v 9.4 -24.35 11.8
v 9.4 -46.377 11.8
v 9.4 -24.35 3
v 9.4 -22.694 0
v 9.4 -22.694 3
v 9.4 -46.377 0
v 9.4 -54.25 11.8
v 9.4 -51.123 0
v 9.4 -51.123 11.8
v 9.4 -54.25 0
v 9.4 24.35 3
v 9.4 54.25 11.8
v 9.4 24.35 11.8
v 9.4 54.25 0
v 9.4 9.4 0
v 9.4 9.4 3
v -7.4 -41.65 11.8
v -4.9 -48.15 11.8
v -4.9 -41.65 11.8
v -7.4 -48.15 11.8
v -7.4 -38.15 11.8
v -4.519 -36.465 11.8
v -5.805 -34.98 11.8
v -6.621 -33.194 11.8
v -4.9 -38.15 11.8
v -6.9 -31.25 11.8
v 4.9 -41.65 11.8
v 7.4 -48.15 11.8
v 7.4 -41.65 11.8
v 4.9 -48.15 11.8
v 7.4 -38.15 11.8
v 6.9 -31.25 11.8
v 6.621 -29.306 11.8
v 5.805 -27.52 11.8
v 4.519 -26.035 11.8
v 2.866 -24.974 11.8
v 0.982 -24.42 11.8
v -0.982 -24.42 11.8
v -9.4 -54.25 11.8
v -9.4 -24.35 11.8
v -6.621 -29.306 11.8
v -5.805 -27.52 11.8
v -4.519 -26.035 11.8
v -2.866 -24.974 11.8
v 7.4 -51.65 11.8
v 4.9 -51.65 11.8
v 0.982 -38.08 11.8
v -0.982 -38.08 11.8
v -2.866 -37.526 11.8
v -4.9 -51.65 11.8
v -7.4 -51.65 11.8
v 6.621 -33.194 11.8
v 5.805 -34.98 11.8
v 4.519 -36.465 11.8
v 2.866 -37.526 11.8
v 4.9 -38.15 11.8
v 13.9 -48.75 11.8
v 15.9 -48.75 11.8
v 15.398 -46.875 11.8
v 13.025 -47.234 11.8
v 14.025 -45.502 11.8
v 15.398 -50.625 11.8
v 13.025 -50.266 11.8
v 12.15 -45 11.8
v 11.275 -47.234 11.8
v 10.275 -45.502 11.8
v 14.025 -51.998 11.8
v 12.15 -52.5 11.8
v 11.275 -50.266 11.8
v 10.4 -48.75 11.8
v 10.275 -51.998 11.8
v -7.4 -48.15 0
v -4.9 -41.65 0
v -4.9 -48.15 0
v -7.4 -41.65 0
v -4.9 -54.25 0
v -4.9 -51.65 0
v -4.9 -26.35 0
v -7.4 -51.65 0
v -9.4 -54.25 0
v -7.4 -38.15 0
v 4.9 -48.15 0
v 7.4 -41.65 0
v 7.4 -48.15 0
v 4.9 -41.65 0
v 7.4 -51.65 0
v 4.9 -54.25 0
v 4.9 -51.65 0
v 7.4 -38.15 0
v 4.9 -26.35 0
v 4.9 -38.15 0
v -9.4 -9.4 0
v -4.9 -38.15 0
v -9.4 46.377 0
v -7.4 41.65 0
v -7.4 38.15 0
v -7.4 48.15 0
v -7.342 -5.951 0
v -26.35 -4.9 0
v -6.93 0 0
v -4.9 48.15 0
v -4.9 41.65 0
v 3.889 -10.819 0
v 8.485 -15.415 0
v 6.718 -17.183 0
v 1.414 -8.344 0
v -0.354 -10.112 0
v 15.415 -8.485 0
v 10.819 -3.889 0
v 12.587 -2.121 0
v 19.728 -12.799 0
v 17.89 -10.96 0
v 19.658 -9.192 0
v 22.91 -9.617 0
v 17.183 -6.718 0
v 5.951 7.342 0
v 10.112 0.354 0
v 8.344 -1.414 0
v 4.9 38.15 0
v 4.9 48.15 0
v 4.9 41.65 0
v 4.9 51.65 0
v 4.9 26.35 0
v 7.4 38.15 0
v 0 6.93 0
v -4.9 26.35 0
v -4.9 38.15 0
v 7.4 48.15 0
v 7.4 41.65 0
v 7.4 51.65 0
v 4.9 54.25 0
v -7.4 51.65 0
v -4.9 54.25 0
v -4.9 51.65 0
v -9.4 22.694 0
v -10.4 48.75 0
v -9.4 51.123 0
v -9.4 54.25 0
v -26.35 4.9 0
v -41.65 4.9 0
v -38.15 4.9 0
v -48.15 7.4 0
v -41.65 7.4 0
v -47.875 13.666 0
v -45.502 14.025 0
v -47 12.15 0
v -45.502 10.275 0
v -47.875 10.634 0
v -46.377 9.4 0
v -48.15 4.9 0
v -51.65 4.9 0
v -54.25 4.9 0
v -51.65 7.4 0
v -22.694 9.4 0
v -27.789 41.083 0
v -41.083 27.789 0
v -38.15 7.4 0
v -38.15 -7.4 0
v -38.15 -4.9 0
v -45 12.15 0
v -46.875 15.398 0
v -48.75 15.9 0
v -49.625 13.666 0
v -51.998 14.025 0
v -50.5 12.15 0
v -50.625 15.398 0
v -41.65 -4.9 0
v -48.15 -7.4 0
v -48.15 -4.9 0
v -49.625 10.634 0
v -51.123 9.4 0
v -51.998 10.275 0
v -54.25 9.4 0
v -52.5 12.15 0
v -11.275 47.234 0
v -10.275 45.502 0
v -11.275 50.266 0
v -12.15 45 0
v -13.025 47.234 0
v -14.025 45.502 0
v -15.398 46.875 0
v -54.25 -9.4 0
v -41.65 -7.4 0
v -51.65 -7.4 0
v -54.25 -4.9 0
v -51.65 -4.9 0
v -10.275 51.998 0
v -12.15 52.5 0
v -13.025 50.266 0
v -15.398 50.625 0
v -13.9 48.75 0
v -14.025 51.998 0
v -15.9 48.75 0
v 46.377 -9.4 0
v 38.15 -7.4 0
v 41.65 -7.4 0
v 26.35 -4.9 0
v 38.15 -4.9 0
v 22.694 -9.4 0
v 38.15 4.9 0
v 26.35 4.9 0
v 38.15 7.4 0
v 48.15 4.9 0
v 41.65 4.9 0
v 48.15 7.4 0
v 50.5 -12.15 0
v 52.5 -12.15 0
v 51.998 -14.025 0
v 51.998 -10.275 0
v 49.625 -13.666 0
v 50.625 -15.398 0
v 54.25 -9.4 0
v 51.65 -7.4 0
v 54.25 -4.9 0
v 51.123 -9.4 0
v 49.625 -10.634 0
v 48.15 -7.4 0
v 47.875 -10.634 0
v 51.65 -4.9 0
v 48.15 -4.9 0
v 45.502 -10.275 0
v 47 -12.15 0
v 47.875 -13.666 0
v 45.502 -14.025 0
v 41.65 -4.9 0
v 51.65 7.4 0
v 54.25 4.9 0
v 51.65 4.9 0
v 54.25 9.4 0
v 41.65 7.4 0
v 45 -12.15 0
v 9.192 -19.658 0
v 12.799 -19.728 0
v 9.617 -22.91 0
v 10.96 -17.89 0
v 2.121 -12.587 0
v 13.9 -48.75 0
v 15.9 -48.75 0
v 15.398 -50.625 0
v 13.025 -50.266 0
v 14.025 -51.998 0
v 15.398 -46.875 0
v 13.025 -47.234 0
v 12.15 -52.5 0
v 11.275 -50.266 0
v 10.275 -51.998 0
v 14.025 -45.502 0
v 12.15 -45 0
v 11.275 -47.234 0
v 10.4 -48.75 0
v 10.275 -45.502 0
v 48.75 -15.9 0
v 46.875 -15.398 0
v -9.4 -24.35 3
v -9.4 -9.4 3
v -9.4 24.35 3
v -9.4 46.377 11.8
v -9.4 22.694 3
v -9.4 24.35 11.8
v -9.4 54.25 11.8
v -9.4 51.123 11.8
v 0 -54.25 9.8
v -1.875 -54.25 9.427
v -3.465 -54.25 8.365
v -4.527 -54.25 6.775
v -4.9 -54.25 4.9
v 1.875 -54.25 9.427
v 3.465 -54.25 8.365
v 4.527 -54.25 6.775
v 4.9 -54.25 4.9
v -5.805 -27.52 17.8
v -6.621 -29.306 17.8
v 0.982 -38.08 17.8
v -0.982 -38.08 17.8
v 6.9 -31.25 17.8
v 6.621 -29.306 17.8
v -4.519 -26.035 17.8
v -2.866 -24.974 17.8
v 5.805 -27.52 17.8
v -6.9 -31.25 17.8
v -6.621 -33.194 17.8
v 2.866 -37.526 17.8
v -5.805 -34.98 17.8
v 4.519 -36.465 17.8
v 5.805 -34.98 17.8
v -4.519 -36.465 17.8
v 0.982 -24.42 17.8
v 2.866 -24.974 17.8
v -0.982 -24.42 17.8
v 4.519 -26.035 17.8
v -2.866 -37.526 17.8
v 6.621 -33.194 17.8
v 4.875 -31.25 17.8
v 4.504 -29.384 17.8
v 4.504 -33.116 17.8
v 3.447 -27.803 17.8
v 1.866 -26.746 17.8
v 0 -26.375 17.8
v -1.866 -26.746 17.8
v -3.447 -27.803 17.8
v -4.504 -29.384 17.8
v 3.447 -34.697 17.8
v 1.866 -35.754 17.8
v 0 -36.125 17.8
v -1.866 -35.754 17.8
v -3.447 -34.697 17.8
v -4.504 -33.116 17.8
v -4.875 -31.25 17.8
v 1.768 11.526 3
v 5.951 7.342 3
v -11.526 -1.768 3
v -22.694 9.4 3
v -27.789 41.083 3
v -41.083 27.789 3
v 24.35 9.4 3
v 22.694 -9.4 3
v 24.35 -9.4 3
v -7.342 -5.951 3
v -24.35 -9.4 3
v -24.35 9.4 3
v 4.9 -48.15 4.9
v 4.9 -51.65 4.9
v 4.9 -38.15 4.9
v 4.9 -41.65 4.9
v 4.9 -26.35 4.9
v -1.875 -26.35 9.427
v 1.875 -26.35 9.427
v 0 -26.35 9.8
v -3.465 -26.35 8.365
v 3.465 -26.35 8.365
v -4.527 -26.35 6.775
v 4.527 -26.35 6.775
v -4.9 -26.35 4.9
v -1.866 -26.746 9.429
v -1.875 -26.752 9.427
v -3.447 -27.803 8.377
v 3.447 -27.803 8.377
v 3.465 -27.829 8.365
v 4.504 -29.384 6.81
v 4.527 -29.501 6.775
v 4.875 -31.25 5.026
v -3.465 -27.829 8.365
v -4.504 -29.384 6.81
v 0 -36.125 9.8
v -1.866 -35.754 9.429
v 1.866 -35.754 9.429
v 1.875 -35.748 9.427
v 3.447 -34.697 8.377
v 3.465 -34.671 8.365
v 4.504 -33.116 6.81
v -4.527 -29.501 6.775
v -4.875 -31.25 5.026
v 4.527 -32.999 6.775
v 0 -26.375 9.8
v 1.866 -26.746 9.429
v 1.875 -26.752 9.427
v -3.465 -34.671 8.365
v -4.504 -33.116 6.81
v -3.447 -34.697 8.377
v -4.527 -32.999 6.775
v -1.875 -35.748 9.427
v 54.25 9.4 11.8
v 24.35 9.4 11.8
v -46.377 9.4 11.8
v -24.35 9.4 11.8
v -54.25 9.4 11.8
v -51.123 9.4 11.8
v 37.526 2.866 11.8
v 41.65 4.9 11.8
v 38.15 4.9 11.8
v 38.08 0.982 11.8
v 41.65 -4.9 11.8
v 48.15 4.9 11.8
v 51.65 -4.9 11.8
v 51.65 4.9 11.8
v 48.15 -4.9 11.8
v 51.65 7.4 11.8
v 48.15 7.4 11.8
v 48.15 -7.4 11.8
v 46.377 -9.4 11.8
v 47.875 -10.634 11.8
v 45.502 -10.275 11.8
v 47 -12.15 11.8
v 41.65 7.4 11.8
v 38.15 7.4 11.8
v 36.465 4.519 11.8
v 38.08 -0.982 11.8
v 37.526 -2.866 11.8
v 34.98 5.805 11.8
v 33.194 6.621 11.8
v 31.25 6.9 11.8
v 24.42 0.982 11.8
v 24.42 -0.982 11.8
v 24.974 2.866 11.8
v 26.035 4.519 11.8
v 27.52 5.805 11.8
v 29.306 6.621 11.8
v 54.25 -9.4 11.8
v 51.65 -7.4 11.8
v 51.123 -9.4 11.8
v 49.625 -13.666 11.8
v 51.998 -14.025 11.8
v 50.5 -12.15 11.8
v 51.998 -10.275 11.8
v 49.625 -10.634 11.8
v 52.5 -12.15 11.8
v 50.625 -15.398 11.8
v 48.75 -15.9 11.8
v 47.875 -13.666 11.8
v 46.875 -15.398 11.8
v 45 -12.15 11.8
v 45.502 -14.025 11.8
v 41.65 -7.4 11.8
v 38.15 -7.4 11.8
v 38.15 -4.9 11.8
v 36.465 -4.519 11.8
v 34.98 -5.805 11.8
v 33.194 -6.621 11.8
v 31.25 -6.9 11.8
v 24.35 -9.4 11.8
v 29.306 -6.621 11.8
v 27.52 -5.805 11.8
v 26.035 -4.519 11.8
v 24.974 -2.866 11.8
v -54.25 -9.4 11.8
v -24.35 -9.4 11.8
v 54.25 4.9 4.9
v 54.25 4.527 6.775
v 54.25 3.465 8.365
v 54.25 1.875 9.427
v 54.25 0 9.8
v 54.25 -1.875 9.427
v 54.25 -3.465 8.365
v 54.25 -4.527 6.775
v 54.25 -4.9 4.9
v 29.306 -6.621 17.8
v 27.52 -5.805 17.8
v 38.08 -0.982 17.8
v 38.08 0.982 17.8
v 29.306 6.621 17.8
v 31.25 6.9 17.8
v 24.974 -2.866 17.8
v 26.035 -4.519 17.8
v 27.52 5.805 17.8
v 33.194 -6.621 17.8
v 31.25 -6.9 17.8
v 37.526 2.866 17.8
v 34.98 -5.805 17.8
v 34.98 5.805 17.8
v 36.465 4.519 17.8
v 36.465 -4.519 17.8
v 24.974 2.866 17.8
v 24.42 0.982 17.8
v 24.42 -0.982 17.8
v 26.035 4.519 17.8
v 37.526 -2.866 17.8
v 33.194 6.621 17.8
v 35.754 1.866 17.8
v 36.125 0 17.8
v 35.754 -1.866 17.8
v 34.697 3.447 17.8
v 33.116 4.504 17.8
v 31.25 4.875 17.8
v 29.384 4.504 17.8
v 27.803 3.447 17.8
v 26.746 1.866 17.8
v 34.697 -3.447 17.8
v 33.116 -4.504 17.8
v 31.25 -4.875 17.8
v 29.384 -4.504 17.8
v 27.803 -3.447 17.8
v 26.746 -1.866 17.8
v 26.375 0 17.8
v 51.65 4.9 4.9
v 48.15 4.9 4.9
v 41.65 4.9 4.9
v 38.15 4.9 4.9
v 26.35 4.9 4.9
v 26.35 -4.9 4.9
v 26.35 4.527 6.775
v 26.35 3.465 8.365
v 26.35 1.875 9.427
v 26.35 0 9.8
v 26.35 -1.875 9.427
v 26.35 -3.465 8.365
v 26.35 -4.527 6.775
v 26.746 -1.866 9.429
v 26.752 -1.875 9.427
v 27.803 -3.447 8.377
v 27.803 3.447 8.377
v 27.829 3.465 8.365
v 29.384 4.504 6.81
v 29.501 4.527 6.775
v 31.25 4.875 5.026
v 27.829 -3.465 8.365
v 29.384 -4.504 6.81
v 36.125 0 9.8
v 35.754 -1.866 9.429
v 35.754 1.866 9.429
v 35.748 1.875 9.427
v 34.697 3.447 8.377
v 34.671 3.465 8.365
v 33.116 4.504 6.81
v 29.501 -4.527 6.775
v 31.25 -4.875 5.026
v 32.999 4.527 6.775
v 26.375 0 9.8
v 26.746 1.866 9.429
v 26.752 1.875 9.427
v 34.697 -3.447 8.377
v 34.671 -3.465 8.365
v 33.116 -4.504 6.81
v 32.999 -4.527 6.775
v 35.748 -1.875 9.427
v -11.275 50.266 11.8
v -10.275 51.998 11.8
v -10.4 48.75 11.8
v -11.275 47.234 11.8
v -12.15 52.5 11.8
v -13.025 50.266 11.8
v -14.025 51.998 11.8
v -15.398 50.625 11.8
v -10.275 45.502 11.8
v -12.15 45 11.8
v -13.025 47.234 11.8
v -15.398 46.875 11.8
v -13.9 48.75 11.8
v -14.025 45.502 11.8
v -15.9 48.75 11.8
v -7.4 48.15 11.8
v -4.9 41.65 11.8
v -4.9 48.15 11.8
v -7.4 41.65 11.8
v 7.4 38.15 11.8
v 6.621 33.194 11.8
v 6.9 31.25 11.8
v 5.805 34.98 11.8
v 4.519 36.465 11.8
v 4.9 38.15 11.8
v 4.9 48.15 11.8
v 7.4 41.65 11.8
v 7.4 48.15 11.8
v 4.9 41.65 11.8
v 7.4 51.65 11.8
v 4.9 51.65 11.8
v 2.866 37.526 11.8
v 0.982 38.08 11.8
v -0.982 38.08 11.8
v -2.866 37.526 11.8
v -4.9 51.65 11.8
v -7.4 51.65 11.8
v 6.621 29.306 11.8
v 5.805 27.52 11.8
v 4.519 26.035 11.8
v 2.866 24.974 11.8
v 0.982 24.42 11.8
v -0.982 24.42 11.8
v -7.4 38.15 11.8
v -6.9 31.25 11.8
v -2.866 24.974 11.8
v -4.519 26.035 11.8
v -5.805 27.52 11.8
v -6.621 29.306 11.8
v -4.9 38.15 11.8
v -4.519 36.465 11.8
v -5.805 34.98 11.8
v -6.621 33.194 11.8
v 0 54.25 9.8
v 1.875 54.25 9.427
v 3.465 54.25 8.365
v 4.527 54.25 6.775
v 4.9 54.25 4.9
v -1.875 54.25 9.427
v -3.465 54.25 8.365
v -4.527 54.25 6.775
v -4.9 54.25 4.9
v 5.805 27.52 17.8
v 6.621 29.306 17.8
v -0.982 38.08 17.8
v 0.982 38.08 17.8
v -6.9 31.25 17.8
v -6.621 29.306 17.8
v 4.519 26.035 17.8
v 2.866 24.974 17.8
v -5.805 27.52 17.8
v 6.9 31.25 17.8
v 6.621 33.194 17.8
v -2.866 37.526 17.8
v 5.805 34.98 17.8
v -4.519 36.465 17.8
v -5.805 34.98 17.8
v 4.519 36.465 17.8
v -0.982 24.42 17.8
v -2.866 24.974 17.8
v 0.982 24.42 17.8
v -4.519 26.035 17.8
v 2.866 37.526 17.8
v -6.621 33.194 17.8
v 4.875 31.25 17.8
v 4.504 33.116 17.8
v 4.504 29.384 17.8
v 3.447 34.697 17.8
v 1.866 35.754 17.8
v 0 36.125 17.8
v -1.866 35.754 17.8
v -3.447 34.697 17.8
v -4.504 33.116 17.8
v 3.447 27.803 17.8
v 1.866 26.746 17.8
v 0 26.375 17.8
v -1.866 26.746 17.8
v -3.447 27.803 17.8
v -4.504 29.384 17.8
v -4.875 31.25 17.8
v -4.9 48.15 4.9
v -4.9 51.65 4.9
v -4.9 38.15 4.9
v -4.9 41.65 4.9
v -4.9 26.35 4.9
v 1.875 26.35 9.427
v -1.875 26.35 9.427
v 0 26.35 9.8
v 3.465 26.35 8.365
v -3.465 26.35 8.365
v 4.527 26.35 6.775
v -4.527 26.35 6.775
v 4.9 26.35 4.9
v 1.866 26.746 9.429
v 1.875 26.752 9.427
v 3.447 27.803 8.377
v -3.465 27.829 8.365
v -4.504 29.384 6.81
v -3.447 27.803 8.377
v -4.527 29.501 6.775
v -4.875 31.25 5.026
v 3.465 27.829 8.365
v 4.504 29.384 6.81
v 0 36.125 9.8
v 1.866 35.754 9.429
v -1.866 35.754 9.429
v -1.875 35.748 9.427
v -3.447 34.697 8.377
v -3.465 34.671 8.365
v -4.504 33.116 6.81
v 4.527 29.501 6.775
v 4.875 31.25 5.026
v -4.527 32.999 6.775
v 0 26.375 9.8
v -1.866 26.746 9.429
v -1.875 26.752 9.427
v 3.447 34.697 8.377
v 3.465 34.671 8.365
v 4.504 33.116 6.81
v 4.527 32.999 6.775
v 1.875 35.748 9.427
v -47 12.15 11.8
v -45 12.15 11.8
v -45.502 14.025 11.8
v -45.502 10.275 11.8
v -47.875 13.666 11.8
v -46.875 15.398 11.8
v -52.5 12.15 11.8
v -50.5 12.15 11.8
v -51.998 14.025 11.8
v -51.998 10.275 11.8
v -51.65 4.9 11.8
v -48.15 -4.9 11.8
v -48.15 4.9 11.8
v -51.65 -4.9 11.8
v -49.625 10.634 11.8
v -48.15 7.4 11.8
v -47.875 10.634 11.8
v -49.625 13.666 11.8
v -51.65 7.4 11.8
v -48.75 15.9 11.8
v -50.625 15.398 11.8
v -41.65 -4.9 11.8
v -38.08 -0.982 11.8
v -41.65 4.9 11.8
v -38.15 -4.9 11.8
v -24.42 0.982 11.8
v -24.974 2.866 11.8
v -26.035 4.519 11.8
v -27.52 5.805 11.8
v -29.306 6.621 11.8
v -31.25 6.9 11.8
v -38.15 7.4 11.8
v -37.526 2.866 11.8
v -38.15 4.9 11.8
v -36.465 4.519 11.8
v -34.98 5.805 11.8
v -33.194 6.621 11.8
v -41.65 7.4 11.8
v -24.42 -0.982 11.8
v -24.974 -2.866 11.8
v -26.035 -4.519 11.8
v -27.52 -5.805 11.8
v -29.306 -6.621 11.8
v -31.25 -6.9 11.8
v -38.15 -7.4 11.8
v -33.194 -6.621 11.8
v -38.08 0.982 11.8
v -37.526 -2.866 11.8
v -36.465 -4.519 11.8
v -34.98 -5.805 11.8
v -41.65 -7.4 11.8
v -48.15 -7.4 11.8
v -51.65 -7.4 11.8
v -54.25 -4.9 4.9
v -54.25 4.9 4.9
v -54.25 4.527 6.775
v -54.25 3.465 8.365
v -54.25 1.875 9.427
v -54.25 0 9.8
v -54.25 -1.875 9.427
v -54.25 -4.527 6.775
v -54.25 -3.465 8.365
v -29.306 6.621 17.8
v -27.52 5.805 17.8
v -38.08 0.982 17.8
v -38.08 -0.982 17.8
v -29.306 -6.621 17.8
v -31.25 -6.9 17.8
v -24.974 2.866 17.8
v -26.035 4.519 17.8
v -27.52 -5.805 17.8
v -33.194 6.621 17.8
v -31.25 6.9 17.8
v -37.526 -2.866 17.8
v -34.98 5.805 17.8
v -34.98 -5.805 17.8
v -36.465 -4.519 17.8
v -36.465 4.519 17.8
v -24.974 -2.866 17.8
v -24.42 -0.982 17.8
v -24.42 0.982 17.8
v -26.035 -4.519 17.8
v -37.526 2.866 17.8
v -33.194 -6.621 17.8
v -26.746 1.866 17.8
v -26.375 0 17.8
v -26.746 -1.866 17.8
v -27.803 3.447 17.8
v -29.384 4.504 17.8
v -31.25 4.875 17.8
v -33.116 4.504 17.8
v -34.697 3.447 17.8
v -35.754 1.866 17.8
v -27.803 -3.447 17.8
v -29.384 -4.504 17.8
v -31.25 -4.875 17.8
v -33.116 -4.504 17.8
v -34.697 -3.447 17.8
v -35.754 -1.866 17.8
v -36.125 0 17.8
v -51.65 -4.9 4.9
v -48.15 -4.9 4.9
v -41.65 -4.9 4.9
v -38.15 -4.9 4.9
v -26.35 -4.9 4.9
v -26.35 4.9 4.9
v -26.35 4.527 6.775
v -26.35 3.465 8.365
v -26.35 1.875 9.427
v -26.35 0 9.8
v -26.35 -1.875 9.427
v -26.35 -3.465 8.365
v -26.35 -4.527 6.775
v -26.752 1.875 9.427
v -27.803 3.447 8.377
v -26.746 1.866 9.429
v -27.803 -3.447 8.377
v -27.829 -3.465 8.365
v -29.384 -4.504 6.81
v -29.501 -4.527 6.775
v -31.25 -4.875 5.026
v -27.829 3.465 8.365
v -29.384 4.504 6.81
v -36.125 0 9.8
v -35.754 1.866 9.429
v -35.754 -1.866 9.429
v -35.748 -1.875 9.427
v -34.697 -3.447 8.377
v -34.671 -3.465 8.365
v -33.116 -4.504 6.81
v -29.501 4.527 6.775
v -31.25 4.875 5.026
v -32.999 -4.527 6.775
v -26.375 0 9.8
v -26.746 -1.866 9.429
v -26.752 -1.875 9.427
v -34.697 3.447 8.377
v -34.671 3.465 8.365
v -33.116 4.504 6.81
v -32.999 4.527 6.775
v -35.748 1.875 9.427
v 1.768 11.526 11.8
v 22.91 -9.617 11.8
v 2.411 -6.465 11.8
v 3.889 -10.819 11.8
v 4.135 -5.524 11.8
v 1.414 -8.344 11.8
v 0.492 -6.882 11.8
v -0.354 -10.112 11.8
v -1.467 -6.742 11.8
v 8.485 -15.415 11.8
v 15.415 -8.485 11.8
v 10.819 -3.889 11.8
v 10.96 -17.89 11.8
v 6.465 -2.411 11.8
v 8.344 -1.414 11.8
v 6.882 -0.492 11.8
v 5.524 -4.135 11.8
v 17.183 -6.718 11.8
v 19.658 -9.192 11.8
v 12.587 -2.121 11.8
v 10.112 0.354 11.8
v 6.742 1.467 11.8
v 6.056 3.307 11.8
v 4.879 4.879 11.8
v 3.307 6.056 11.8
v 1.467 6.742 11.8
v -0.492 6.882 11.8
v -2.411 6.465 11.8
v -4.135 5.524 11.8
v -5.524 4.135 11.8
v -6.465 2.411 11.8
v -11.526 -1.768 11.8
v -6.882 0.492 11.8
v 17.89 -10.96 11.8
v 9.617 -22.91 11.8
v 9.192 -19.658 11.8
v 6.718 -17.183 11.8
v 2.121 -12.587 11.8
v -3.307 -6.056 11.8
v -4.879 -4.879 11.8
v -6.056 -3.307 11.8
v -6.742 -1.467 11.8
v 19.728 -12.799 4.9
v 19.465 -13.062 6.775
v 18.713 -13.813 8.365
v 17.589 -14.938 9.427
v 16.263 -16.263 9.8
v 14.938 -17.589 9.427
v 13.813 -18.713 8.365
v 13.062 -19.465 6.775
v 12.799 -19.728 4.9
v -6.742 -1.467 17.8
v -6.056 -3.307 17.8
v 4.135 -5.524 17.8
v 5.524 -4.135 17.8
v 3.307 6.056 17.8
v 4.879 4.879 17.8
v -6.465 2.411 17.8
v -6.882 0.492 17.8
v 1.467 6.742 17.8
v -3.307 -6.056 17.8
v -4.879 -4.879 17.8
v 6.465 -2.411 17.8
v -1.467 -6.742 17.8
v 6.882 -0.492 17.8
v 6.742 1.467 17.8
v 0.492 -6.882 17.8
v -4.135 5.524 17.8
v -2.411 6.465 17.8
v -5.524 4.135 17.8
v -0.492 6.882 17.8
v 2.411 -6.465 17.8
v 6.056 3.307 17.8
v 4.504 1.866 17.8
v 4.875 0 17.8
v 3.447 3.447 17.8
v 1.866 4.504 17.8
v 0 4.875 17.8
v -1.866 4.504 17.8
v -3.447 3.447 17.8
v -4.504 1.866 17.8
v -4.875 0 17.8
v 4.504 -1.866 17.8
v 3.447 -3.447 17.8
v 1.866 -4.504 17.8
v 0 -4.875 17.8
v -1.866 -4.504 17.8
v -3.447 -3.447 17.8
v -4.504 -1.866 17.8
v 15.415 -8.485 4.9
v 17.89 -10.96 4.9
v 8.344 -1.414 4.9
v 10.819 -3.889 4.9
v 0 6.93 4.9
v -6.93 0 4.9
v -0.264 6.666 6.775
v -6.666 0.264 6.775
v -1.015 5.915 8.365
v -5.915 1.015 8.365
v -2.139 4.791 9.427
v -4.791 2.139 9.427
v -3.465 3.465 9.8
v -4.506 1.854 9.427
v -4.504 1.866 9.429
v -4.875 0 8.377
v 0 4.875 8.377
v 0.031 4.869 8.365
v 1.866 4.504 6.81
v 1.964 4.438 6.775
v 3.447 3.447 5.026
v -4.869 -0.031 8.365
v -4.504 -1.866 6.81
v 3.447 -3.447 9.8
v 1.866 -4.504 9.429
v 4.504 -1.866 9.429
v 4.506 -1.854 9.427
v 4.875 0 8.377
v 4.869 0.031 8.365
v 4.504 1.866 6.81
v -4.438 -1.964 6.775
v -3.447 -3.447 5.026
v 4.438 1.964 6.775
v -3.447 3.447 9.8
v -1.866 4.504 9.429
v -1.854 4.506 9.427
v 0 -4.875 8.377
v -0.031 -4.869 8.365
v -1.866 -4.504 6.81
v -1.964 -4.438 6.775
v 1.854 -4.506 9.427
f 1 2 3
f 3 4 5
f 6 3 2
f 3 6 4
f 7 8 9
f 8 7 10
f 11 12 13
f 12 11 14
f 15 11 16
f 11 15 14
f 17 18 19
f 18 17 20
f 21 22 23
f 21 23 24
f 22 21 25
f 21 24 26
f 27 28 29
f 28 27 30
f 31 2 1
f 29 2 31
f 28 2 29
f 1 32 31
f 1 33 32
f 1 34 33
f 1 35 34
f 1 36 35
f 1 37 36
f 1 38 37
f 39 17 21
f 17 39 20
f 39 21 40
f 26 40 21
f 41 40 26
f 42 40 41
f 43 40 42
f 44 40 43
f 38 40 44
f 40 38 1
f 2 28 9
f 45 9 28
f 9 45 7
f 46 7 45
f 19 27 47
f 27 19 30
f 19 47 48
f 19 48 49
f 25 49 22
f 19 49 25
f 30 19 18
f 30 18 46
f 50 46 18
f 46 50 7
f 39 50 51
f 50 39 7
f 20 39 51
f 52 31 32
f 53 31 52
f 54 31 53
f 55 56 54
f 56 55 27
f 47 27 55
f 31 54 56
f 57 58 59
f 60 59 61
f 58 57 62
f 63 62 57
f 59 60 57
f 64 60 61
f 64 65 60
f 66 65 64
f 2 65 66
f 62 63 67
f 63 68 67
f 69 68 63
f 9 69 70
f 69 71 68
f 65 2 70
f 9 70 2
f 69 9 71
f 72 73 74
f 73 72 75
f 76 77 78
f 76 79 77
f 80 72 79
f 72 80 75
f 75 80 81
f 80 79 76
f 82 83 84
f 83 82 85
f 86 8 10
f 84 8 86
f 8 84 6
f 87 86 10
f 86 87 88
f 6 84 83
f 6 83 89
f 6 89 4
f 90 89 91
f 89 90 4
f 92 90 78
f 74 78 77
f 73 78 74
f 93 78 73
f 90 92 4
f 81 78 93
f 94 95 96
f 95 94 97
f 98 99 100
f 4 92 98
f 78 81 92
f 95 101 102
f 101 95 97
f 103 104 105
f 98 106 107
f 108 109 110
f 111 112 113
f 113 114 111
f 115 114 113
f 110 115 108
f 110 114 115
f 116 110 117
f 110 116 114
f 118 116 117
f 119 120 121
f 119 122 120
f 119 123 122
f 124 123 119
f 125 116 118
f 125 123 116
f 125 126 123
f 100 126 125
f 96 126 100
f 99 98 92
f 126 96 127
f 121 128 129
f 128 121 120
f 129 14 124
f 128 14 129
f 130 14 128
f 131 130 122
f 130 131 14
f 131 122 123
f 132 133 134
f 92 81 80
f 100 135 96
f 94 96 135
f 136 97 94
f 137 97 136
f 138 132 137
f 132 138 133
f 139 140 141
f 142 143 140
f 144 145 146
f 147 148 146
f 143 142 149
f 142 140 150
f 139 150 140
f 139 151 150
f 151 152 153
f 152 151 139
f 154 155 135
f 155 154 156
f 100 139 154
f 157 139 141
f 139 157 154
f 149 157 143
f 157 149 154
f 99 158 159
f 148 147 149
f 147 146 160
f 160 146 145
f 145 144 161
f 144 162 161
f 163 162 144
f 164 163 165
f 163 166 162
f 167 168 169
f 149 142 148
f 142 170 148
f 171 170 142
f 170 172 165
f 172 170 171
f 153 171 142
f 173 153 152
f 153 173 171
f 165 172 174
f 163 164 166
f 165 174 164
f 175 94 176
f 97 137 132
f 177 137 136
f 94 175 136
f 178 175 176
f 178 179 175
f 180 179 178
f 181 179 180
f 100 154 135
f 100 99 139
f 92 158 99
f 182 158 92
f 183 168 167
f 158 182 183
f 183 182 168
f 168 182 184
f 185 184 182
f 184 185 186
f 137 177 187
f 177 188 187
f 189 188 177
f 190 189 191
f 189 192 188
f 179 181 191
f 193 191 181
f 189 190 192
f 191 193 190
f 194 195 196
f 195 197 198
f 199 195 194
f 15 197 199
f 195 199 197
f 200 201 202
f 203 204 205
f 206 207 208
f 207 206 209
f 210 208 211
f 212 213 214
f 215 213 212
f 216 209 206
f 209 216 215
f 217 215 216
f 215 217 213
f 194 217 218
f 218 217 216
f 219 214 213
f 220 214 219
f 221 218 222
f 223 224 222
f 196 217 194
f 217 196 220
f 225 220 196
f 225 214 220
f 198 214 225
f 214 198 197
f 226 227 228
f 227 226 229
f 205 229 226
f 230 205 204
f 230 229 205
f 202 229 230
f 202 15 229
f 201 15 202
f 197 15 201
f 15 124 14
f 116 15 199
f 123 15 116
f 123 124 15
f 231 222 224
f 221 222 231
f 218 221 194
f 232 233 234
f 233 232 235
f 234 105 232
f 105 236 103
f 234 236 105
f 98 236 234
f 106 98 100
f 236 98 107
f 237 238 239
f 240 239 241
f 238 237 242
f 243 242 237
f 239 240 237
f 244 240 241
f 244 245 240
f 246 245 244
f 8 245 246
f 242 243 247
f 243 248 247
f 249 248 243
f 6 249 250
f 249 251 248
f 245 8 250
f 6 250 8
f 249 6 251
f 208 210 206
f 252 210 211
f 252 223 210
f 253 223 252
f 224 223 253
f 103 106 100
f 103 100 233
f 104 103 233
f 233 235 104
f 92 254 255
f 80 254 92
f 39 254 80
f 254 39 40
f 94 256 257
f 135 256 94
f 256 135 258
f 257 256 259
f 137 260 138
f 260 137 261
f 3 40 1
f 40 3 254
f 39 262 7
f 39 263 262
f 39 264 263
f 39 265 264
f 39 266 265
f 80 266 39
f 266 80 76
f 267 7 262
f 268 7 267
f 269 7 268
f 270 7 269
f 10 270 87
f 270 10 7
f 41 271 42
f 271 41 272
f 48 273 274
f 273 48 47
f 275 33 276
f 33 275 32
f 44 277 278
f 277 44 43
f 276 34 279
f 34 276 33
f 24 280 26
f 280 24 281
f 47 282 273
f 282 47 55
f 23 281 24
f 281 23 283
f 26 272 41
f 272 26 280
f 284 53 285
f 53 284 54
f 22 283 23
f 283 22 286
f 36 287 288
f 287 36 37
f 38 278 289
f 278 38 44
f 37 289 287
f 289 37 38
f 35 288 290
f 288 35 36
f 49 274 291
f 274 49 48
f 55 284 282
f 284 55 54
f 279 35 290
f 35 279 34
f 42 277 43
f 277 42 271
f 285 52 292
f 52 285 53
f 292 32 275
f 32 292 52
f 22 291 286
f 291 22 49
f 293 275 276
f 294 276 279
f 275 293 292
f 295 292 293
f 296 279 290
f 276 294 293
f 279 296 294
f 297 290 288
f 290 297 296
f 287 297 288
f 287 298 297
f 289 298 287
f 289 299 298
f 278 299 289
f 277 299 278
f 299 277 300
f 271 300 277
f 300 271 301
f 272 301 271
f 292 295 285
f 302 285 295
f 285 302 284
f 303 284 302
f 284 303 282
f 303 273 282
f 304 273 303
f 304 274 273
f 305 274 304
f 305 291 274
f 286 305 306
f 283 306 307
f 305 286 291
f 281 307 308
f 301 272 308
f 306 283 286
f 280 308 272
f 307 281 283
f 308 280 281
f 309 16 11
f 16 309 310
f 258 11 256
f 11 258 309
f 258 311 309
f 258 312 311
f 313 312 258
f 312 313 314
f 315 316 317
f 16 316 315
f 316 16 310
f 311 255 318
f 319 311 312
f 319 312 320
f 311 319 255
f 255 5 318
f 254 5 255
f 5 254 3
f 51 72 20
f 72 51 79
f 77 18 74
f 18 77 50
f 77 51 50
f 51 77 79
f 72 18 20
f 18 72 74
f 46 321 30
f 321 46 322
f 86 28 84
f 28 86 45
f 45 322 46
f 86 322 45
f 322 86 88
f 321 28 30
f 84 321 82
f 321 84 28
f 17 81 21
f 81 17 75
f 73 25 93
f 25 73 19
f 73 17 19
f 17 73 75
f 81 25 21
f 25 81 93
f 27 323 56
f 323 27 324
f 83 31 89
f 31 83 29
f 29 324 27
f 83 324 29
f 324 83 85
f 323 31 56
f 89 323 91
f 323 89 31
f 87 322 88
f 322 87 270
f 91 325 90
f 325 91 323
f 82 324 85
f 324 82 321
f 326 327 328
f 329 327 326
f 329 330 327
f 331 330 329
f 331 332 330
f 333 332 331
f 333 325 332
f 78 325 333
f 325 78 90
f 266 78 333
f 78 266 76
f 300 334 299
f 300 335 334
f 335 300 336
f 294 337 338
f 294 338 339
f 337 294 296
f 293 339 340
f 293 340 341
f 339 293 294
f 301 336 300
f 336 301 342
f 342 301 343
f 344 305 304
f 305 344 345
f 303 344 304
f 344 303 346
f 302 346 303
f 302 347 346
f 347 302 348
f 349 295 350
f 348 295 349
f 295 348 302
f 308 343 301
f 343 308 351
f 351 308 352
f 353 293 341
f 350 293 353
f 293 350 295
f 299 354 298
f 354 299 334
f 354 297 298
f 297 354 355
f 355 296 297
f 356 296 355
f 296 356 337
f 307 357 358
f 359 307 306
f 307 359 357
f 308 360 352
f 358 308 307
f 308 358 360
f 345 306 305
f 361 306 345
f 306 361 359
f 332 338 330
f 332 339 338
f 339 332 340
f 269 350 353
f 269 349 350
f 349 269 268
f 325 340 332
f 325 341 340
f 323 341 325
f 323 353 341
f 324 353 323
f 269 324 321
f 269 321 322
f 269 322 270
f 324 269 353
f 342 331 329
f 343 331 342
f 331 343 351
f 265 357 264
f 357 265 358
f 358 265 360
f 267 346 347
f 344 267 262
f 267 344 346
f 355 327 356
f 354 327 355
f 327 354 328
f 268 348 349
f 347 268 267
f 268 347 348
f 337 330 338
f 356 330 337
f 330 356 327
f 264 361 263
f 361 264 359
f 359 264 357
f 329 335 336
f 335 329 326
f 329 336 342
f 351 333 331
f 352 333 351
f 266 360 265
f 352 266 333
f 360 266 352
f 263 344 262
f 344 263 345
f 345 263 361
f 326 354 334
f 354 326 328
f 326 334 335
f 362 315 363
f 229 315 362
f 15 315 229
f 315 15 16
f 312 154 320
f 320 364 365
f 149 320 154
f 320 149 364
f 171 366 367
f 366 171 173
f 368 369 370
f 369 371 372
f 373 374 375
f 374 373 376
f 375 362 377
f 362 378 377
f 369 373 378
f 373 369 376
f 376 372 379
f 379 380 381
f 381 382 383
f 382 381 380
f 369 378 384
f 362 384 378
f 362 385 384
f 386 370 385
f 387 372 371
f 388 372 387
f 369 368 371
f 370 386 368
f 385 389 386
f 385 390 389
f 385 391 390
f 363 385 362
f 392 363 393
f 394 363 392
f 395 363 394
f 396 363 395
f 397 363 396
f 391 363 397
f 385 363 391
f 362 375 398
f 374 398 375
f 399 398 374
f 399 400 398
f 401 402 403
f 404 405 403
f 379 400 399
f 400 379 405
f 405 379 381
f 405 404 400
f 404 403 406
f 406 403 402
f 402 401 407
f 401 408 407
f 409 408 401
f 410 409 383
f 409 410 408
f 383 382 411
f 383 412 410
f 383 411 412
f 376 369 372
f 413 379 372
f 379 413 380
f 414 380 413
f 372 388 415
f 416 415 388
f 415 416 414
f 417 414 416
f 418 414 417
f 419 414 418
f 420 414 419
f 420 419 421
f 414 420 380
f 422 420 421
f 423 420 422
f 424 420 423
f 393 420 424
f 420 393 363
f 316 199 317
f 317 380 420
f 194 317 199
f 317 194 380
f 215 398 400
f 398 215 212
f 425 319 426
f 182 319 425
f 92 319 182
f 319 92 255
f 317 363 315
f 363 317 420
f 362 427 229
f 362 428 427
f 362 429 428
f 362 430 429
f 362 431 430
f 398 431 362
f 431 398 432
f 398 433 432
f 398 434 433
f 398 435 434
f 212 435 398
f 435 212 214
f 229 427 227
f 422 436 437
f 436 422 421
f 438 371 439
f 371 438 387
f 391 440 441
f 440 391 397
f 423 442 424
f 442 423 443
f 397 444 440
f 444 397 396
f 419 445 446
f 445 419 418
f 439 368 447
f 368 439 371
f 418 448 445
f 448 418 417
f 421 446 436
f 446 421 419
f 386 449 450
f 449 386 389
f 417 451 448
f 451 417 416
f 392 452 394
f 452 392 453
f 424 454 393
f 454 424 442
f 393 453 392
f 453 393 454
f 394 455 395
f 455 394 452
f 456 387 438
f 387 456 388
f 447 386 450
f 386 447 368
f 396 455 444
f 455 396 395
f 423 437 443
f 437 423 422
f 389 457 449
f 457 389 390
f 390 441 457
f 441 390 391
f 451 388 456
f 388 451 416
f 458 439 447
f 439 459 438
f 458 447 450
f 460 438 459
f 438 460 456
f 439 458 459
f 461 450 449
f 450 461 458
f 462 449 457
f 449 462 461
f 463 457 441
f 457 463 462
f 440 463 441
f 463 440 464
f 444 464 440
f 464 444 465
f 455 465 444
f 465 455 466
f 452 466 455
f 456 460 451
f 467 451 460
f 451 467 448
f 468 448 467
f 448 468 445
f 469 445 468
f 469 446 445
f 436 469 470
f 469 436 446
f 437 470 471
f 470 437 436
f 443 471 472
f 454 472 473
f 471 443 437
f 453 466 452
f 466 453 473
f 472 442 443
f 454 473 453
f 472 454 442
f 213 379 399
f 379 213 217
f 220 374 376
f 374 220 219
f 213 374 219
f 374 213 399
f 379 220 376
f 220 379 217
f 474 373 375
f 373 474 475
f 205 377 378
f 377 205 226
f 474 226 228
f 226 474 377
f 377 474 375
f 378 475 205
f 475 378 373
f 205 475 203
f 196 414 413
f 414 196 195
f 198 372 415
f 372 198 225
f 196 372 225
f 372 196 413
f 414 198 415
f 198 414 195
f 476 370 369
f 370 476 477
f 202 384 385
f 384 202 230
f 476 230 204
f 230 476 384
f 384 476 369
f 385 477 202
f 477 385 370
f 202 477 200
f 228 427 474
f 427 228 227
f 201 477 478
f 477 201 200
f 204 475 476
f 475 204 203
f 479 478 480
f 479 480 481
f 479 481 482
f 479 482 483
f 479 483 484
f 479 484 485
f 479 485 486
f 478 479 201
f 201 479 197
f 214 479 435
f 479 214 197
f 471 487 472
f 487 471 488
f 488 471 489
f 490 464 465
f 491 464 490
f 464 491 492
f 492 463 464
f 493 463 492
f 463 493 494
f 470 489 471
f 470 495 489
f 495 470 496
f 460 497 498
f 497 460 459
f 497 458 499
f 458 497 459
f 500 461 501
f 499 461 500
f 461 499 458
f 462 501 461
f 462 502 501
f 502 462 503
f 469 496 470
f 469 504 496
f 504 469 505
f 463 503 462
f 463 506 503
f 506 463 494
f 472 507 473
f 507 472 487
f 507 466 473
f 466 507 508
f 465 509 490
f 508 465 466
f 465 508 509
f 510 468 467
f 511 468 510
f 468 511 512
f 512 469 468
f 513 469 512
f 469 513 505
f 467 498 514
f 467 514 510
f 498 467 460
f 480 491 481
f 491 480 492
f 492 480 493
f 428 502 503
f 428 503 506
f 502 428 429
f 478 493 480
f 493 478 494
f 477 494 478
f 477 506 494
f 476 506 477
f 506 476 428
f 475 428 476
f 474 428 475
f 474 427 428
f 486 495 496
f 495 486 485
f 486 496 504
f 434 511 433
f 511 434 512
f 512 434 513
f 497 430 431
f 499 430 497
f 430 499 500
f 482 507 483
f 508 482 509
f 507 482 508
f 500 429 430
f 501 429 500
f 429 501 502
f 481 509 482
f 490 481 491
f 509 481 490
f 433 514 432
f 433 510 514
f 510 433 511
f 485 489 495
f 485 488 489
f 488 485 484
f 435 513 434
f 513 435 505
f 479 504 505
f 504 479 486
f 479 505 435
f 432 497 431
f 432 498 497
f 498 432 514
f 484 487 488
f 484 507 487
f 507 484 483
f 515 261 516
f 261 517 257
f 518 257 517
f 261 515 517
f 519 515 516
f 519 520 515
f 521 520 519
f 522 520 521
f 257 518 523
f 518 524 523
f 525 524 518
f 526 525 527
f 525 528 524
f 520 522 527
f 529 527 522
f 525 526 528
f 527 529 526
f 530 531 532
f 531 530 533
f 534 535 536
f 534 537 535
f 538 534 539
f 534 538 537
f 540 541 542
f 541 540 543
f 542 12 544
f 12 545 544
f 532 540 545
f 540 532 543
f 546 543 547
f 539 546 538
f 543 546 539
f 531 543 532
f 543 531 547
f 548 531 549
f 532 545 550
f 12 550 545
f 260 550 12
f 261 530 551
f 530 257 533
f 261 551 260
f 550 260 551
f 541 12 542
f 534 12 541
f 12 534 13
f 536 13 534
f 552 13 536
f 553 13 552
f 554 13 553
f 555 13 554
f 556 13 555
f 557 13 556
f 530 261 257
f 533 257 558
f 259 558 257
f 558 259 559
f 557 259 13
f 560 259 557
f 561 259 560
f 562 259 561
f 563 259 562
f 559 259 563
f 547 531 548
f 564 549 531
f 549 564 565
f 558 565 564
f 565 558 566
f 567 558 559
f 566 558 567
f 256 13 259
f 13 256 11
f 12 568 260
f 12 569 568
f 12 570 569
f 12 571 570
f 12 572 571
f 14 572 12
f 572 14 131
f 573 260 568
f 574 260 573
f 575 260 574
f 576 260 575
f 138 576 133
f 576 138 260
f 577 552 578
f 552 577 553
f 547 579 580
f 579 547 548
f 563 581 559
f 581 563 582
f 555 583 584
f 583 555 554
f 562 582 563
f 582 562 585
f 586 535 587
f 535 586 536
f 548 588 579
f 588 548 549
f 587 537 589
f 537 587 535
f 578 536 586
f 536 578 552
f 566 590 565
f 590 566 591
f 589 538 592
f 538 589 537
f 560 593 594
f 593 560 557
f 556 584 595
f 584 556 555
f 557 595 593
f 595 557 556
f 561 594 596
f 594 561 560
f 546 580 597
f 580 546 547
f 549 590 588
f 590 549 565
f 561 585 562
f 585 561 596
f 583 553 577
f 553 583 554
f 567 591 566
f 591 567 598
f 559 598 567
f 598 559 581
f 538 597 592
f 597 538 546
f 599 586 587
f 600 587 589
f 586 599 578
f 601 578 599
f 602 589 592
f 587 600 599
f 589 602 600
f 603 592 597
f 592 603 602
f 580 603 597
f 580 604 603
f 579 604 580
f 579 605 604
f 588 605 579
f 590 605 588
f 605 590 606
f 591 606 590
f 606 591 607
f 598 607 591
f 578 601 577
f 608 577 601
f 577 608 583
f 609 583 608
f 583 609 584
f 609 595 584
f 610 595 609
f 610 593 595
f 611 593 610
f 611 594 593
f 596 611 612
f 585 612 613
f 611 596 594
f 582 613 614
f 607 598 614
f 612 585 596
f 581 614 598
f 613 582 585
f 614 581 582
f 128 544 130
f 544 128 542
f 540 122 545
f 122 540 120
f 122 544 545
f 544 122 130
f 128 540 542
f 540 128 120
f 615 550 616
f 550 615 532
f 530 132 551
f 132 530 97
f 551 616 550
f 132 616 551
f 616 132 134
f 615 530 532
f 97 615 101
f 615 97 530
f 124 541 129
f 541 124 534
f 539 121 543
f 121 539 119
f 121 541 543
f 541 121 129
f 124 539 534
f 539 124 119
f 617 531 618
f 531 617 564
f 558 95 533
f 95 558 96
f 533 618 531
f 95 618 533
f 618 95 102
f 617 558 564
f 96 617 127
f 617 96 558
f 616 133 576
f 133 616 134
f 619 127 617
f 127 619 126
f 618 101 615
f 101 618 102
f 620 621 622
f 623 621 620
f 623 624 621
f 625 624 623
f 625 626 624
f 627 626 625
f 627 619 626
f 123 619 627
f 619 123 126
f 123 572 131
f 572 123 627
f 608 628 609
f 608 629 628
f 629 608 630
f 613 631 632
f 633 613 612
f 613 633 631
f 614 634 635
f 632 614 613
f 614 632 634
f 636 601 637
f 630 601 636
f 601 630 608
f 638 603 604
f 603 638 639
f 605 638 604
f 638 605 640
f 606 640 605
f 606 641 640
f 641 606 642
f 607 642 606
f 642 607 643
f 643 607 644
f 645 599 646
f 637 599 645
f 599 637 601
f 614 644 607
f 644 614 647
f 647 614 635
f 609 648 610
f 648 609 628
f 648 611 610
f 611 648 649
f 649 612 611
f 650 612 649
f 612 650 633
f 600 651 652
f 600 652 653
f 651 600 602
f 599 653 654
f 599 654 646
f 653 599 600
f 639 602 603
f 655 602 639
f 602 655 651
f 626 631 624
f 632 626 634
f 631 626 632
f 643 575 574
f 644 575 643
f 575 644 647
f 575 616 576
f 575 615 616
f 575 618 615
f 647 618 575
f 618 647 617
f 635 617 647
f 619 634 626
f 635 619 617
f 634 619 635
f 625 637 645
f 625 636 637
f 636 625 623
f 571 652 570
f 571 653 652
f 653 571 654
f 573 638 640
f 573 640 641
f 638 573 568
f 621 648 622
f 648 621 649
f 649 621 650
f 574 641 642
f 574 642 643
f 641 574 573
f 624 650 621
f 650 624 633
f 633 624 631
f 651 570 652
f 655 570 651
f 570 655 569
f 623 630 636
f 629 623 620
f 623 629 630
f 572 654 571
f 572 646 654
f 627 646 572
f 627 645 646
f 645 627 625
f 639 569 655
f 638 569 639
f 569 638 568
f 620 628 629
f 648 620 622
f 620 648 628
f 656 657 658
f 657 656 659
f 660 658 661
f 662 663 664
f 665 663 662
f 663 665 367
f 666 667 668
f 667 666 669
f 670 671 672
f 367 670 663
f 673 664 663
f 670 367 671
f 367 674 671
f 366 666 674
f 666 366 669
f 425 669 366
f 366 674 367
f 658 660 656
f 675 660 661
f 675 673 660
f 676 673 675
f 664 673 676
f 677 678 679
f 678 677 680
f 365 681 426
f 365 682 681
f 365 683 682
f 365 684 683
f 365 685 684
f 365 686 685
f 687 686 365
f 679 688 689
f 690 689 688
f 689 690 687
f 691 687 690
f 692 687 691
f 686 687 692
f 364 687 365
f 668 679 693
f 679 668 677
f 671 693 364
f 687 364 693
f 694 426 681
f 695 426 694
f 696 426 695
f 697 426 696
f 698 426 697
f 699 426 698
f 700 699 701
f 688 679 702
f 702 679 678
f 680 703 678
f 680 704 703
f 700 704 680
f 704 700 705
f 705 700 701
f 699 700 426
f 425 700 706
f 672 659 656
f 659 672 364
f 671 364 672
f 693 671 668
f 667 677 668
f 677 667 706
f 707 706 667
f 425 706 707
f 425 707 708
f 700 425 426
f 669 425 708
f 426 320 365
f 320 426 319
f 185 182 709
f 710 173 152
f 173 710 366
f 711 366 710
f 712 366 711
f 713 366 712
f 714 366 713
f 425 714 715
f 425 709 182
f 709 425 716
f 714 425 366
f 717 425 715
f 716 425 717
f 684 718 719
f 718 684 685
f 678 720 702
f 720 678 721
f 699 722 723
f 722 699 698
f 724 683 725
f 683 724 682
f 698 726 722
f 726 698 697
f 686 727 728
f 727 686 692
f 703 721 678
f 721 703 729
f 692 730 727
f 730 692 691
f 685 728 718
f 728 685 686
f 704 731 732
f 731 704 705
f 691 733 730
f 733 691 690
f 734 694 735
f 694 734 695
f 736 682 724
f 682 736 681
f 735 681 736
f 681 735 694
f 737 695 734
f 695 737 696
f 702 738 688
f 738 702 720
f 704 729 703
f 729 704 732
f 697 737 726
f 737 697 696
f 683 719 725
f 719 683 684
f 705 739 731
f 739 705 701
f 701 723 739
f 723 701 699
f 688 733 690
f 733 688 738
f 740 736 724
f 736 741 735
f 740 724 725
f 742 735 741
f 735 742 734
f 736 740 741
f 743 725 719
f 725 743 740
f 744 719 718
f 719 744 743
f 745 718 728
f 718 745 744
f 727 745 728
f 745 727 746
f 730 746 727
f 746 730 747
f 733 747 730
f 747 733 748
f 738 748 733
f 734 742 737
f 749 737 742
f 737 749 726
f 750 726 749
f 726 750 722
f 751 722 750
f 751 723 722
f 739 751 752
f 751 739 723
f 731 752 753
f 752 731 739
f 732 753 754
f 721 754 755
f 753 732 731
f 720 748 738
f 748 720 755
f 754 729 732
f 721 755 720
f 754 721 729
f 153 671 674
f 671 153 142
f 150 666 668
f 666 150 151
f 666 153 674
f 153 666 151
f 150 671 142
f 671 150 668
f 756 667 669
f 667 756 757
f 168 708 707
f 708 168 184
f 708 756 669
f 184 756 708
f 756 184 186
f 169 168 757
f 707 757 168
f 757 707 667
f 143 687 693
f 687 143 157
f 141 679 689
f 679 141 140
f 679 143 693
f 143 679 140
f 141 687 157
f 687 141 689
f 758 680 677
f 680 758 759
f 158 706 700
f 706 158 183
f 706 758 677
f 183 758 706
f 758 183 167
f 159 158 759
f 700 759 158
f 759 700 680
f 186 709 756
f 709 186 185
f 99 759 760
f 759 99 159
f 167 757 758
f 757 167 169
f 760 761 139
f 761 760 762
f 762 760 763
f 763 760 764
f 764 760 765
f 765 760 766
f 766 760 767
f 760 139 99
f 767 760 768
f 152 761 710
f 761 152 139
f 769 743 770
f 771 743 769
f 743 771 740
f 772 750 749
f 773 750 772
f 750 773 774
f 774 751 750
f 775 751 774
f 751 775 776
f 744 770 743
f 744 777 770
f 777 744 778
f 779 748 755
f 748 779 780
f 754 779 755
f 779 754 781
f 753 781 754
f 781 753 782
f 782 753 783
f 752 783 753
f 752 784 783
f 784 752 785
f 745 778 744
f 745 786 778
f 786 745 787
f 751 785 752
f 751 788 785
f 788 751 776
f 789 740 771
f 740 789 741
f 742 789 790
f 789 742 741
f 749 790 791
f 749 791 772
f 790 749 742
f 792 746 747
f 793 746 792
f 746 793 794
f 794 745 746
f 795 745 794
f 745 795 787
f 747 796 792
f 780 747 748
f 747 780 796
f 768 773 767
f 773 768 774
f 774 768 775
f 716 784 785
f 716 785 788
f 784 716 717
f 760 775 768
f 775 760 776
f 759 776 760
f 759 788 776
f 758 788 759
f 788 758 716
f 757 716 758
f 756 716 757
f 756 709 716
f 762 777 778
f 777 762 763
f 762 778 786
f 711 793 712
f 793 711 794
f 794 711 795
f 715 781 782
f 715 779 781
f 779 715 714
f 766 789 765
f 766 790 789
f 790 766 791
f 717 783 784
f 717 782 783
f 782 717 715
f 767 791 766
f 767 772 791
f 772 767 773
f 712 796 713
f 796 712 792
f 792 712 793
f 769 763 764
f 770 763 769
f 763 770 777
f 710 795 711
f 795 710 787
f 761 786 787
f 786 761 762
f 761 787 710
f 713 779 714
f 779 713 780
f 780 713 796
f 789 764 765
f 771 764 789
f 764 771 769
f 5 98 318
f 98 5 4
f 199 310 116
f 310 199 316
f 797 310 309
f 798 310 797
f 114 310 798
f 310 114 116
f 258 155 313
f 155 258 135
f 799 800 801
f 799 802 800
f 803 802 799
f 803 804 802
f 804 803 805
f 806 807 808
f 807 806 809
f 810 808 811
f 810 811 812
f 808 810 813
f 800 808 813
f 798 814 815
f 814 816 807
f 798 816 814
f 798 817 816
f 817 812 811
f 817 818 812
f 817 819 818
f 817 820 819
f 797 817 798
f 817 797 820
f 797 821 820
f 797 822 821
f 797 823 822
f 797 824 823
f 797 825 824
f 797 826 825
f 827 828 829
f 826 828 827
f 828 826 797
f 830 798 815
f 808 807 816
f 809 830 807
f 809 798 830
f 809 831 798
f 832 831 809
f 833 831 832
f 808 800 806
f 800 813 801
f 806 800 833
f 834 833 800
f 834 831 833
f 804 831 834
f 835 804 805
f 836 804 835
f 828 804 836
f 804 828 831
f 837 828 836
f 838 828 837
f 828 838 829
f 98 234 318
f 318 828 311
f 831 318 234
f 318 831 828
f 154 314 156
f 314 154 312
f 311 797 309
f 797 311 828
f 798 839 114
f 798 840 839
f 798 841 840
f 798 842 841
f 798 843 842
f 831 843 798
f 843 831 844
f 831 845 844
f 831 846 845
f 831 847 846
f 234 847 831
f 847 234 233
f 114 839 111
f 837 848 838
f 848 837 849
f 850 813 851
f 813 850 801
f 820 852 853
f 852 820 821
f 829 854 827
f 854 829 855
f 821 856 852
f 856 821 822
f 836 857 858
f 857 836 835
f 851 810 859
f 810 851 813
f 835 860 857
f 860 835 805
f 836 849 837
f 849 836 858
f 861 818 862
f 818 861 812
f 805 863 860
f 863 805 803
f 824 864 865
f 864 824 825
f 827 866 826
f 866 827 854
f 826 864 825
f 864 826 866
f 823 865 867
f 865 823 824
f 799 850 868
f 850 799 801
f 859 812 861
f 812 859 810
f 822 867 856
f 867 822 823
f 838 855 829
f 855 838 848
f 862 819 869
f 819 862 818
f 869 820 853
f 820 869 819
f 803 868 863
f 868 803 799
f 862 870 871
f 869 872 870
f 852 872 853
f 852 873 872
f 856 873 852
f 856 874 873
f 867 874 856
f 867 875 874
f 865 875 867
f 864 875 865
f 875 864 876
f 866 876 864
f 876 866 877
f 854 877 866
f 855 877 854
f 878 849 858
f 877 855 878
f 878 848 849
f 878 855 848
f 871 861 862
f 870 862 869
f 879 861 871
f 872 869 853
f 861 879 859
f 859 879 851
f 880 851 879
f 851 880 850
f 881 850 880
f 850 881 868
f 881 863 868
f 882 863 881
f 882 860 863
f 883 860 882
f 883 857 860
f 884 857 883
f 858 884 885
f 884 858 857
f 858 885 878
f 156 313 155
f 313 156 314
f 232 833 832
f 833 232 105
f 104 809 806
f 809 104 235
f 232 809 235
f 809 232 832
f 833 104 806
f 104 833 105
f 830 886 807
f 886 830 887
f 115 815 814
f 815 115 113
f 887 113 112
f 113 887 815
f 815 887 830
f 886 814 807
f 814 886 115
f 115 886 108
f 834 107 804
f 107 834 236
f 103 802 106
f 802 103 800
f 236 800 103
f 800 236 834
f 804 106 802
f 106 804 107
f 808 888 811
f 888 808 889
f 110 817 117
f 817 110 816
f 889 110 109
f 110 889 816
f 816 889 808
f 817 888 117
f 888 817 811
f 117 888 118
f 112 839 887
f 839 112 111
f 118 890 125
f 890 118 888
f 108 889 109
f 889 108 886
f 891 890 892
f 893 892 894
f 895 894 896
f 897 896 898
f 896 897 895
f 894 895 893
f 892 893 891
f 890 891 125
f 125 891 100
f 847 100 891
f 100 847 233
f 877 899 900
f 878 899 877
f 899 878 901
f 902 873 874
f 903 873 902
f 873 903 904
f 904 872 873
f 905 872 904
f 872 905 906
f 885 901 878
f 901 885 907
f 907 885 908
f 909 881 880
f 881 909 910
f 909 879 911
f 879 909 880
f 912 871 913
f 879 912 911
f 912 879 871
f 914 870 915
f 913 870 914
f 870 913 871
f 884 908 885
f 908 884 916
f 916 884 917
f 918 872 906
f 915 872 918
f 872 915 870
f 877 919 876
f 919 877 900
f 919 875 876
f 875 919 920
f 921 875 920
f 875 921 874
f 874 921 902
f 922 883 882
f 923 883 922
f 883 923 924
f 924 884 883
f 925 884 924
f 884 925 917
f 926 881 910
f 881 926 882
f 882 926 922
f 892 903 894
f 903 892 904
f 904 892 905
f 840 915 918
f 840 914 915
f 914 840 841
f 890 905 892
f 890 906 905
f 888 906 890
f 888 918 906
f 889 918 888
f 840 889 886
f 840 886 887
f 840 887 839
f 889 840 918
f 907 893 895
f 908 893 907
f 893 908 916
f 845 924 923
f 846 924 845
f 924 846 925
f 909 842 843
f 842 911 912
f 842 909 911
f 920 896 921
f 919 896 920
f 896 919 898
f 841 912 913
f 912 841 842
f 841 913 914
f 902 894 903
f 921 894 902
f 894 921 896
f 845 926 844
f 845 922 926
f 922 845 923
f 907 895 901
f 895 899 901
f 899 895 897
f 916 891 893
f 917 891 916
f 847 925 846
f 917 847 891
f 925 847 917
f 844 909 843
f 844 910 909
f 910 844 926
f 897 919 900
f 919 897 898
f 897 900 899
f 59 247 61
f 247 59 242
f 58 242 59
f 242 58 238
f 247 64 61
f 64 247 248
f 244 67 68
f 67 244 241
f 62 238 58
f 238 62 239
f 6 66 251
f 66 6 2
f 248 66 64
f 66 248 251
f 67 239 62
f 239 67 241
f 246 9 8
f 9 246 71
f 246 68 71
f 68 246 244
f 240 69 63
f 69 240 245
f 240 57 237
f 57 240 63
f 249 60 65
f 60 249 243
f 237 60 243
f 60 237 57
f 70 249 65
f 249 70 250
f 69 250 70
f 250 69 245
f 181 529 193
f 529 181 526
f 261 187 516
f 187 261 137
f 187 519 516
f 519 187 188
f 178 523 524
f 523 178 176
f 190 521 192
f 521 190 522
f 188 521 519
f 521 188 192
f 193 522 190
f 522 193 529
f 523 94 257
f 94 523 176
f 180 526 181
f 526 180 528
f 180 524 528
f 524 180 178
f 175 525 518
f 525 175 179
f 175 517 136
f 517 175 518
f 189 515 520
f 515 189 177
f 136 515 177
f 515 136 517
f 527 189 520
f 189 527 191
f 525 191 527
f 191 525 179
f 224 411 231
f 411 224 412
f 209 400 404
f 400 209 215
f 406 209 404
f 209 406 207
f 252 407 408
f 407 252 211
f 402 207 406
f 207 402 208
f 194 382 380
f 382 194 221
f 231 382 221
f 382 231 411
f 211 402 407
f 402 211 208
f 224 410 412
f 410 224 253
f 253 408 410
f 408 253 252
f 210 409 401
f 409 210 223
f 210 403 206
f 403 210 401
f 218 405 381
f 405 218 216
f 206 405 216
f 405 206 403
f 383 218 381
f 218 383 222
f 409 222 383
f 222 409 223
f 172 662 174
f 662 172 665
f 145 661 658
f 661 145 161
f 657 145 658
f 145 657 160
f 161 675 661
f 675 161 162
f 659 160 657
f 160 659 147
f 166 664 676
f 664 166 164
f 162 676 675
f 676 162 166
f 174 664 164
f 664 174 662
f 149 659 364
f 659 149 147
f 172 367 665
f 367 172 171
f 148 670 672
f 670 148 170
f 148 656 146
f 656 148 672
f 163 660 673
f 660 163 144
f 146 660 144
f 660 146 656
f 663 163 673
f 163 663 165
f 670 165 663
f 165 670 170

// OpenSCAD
wave_length=125/2;
antenna_width=10-0.2;
antenna_stalk_width=10-0.25;
antenna_base_length=23;

base_width=wave_length+2*antenna_base_length;
height=antenna_width+8;

ziptie_width=3.5;
ziptie_depth=2.5;

dry_screw_r=5.5/2; //dry wall
screw_r=3.5/2; //m3
backing=2;
edges=2;

module antenna_cutout() {
    difference() 
    {
        union() {
            translate([-antenna_width/2-edges-ziptie_depth,-antenna_base_length,0]) cube([
                                antenna_width+ziptie_depth*2+edges*2,
                                antenna_base_length+antenna_width/2+backing,
                                antenna_width+backing]);
            
            cylinder(height,antenna_width/2+backing,antenna_width/2+backing);
             translate([-(antenna_width+ziptie_depth*2+edges*2)/2,0,0]) cube([antenna_width+ziptie_depth*2+edges*2,
            wave_length-antenna_width-2*backing,3]);
        }
        translate([0,0,antenna_width/2]) antenna();
    }
}

module antenna() {
    //antenna cutout below
    translate([antenna_width/2,antenna_width/2,-antenna_width]) rotate([0,0,180]) cube([antenna_width,antenna_base_length+antenna_width/2,antenna_width]);
    
    //the base antenna
    cylinder(height*4,antenna_stalk_width/2,antenna_stalk_width/2);
    translate([0,antenna_width/2,0]) rotate([90,0,0]) {
        cylinder(antenna_base_length+antenna_width/2,antenna_width/2,antenna_width/2);
        }
    
    //a ziptie
    rotate([0,0,180]) translate([antenna_width/2,antenna_width/2+2,-antenna_width]) {
        
        cube([ziptie_depth,ziptie_width,height*2]);
        translate([-antenna_width-ziptie_depth,0,0]) cube([ziptie_depth,ziptie_width,height*2]);
        translate([0,10,0]) {
            cube([ziptie_depth,ziptie_width,height*2]);
            translate([-antenna_width-ziptie_depth,0,0]) cube([ziptie_depth,ziptie_width,height*2]);
        }
    }
}

module screw_hold() {
    difference() {
        cylinder(antenna_width+backing,screw_r+backing,screw_r+backing);
        cylinder(antenna_width+backing,screw_r,screw_r);
    }
}


tx_theta=45;

difference() {
    union() {
        for ( i = [0,90,180,270] ) {
            rotate([0,0,i]) translate([0,-wave_length/2,0]) antenna_cutout();
        }
        /*for ( i = [45,180+45] ) {
            rotate([0,0,i]) translate([0,-wave_length/2+10-20,0]) antenna_cutout();
        }*/
    }

    rotate([0,0,tx_theta]) translate([-antenna_width/2-edges-ziptie_depth,-antenna_base_length,0]) cube([
                        antenna_width+ziptie_depth*2+edges*2,
                        antenna_base_length+antenna_width/2+backing,
                        antenna_width+backing]);
}

rotate([0,0,tx_theta]) antenna_cutout();
    
k1=antenna_width/2+ziptie_depth+(dry_screw_r+backing);
k2=wave_length/2+antenna_base_length-dry_screw_r*2;
translate([k1,-k2,0]) screw_hold();
translate([-k1,k2,0]) screw_hold();
translate([k2,-k1,0]) screw_hold();
translate([-k2,k1,0]) screw_hold();
